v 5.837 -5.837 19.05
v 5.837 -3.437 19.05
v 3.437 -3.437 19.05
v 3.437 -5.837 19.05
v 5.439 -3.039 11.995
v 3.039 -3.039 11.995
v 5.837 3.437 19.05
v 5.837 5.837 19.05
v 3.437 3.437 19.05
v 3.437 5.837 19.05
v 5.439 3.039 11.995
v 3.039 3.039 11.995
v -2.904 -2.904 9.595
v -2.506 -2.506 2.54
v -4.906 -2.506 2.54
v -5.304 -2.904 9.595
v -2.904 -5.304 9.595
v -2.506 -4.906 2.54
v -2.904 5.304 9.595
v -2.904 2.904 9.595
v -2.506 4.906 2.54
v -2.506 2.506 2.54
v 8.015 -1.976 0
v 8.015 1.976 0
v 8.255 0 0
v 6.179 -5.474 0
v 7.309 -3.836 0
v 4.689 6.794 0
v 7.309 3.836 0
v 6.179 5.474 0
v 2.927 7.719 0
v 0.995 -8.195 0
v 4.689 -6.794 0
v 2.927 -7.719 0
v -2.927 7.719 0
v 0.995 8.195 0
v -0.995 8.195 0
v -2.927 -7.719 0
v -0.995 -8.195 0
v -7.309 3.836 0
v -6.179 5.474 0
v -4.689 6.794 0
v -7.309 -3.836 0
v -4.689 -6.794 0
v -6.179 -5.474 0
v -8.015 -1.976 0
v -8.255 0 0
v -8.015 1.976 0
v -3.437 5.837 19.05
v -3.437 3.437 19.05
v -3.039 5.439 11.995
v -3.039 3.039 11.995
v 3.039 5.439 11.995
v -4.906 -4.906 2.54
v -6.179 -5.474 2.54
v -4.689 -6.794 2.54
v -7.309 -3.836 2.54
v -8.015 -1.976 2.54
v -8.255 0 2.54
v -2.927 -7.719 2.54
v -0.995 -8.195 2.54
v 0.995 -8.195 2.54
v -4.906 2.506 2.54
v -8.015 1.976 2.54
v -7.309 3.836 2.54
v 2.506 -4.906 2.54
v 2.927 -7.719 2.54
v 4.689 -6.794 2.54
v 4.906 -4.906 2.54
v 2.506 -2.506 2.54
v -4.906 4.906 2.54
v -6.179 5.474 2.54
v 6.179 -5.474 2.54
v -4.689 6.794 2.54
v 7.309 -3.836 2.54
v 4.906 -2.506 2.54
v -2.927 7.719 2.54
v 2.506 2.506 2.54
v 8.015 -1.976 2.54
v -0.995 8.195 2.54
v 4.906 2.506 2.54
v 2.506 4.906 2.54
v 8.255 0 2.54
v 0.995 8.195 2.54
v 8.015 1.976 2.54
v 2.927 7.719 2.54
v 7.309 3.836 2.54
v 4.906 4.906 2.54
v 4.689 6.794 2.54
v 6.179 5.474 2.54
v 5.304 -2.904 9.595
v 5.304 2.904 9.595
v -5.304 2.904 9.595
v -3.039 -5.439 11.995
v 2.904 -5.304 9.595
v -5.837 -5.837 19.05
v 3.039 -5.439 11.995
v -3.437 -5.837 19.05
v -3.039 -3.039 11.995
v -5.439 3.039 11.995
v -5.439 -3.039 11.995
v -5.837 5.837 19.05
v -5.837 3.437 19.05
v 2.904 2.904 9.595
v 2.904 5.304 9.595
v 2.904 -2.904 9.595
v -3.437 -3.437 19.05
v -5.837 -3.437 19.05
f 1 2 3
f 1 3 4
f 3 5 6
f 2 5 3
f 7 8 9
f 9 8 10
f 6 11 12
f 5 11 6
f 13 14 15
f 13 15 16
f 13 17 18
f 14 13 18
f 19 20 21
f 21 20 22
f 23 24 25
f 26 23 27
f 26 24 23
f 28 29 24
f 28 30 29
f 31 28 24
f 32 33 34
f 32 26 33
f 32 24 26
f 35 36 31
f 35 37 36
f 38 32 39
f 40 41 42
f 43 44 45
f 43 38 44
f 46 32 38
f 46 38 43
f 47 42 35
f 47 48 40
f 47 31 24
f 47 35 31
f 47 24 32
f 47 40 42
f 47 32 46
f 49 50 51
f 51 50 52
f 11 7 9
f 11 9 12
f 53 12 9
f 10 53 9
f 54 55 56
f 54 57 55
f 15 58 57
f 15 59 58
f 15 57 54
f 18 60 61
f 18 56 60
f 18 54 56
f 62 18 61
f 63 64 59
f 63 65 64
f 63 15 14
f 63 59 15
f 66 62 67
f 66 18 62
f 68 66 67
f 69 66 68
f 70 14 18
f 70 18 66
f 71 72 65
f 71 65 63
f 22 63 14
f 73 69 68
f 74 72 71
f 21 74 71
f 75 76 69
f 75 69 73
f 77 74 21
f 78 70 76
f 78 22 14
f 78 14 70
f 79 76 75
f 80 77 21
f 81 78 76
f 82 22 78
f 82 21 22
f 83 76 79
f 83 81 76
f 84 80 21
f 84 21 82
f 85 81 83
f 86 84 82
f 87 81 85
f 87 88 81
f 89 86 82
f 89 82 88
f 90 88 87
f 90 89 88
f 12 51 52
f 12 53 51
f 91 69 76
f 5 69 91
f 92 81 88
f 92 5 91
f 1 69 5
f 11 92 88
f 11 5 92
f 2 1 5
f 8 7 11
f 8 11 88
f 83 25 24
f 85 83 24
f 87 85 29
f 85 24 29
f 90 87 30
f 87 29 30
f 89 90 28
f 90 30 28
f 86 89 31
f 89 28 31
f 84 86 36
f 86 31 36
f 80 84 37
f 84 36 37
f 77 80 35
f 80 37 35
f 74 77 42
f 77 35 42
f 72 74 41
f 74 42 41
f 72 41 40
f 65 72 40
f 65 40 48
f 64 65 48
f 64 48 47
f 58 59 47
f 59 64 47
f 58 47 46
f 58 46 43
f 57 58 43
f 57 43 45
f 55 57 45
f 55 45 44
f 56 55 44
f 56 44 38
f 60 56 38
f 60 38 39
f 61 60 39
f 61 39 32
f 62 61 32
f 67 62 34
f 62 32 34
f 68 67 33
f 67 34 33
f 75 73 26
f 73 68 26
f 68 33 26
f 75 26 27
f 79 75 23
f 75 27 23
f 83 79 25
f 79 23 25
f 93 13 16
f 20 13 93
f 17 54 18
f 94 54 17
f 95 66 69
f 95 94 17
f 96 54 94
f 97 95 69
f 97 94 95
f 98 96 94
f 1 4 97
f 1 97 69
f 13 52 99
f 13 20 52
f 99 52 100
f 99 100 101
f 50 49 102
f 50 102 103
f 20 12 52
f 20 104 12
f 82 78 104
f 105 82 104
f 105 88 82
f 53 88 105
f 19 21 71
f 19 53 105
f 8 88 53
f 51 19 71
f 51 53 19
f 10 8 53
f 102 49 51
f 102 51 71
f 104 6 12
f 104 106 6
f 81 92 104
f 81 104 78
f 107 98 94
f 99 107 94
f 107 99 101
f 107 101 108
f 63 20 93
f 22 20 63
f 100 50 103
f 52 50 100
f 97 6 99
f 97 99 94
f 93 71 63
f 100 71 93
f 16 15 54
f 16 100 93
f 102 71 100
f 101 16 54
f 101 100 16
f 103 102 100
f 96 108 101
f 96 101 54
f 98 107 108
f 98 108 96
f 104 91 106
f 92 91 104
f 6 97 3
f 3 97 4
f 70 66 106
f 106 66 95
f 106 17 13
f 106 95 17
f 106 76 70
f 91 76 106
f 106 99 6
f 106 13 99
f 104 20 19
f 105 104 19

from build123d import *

# Parameters (mm, degrees)
F0_R     = 8.255
F1_DEPTH = 2.54
F8_DEPTH = 33.656
F9_W     = 6.078346395
F9_H     = 6.078346395
F10_W    = 5.8075642901
F10_H    = 5.8075642901


# Not quite as in the source:
# - a pattern or mirror of a feature is missing from the dataset's text; its kind, count and spacing are read off the source's solid


with BuildPart() as f1:
    # F0 (on Top) → F1 (new body)
    with BuildSketch(Plane.XY):
        Circle(F0_R)
    extrude(amount=F1_DEPTH)

    # F2 (on Top) → F5 section 0
    with BuildSketch(Plane.XY):
        Polygon((4.7625, 2.3625), (4.7625, 4.7625), (2.3625, 4.7625), (-2.3625, 4.7625), (-4.7625, 4.7625), (-4.7625, 2.3625), (-4.7625, -2.3625), (-4.7625, -4.7625), (-2.3625, -4.7625), (2.3625, -4.7625), (4.7625, -4.7625), (4.7625, -2.3625), align=None)
    # F4 (on offset) → F5 section 1
    with BuildSketch(Plane.XY.offset(19.05)):
        Polygon((-3.4371664787, 5.8371664787), (-5.8371664787, 5.8371664787), (-5.8371664787, 3.4371664787), (-5.8371664787, -3.4371664787), (-5.8371664787, -5.8371664787), (-3.4371664787, -5.8371664787), (3.4371664787, -5.8371664787), (5.8371664787, -5.8371664787), (5.8371664787, -3.4371664787), (5.8371664787, 3.4371664787), (5.8371664787, 5.8371664787), (3.4371664787, 5.8371664787), align=None)
    loft()

    # F7 (on offset) → F8 (cut, through all)
    with BuildSketch(Plane.XZ.offset(25.4)):
        Polygon((3.0391731975, 11.995), (3.4371664787, 19.05), (-3.4371664787, 19.05), (-3.0391731975, 11.995), align=None)
        Polygon((-2.5057888638, 2.54), (2.5057888638, 2.54), (2.903782145, 9.595), (-2.903782145, 9.595), align=None)
    f8 = extrude(amount=-F8_DEPTH, mode=Mode.SUBTRACT)

    # F8_copies: F8 across plane
    add(f8.mirror(Plane(origin=(0, 0, 0), x_dir=(0.7071067812, -0.7071067812, 0), z_dir=(0.7071067812, 0.7071067812, 0))), mode=Mode.SUBTRACT)

    # F9 (on face) → F11 section 0
    with BuildSketch(Plane.XY.offset(11.995)):
        Rectangle(F9_W, F9_H)
    # F10 (on face) → F11 section 1
    with BuildSketch(Plane(origin=(0, 0, 9.595), x_dir=(1, 0, 0), z_dir=(0, 0, -1))):
        Rectangle(F10_W, F10_H)
    loft(mode=Mode.SUBTRACT)


solid = f1.part
